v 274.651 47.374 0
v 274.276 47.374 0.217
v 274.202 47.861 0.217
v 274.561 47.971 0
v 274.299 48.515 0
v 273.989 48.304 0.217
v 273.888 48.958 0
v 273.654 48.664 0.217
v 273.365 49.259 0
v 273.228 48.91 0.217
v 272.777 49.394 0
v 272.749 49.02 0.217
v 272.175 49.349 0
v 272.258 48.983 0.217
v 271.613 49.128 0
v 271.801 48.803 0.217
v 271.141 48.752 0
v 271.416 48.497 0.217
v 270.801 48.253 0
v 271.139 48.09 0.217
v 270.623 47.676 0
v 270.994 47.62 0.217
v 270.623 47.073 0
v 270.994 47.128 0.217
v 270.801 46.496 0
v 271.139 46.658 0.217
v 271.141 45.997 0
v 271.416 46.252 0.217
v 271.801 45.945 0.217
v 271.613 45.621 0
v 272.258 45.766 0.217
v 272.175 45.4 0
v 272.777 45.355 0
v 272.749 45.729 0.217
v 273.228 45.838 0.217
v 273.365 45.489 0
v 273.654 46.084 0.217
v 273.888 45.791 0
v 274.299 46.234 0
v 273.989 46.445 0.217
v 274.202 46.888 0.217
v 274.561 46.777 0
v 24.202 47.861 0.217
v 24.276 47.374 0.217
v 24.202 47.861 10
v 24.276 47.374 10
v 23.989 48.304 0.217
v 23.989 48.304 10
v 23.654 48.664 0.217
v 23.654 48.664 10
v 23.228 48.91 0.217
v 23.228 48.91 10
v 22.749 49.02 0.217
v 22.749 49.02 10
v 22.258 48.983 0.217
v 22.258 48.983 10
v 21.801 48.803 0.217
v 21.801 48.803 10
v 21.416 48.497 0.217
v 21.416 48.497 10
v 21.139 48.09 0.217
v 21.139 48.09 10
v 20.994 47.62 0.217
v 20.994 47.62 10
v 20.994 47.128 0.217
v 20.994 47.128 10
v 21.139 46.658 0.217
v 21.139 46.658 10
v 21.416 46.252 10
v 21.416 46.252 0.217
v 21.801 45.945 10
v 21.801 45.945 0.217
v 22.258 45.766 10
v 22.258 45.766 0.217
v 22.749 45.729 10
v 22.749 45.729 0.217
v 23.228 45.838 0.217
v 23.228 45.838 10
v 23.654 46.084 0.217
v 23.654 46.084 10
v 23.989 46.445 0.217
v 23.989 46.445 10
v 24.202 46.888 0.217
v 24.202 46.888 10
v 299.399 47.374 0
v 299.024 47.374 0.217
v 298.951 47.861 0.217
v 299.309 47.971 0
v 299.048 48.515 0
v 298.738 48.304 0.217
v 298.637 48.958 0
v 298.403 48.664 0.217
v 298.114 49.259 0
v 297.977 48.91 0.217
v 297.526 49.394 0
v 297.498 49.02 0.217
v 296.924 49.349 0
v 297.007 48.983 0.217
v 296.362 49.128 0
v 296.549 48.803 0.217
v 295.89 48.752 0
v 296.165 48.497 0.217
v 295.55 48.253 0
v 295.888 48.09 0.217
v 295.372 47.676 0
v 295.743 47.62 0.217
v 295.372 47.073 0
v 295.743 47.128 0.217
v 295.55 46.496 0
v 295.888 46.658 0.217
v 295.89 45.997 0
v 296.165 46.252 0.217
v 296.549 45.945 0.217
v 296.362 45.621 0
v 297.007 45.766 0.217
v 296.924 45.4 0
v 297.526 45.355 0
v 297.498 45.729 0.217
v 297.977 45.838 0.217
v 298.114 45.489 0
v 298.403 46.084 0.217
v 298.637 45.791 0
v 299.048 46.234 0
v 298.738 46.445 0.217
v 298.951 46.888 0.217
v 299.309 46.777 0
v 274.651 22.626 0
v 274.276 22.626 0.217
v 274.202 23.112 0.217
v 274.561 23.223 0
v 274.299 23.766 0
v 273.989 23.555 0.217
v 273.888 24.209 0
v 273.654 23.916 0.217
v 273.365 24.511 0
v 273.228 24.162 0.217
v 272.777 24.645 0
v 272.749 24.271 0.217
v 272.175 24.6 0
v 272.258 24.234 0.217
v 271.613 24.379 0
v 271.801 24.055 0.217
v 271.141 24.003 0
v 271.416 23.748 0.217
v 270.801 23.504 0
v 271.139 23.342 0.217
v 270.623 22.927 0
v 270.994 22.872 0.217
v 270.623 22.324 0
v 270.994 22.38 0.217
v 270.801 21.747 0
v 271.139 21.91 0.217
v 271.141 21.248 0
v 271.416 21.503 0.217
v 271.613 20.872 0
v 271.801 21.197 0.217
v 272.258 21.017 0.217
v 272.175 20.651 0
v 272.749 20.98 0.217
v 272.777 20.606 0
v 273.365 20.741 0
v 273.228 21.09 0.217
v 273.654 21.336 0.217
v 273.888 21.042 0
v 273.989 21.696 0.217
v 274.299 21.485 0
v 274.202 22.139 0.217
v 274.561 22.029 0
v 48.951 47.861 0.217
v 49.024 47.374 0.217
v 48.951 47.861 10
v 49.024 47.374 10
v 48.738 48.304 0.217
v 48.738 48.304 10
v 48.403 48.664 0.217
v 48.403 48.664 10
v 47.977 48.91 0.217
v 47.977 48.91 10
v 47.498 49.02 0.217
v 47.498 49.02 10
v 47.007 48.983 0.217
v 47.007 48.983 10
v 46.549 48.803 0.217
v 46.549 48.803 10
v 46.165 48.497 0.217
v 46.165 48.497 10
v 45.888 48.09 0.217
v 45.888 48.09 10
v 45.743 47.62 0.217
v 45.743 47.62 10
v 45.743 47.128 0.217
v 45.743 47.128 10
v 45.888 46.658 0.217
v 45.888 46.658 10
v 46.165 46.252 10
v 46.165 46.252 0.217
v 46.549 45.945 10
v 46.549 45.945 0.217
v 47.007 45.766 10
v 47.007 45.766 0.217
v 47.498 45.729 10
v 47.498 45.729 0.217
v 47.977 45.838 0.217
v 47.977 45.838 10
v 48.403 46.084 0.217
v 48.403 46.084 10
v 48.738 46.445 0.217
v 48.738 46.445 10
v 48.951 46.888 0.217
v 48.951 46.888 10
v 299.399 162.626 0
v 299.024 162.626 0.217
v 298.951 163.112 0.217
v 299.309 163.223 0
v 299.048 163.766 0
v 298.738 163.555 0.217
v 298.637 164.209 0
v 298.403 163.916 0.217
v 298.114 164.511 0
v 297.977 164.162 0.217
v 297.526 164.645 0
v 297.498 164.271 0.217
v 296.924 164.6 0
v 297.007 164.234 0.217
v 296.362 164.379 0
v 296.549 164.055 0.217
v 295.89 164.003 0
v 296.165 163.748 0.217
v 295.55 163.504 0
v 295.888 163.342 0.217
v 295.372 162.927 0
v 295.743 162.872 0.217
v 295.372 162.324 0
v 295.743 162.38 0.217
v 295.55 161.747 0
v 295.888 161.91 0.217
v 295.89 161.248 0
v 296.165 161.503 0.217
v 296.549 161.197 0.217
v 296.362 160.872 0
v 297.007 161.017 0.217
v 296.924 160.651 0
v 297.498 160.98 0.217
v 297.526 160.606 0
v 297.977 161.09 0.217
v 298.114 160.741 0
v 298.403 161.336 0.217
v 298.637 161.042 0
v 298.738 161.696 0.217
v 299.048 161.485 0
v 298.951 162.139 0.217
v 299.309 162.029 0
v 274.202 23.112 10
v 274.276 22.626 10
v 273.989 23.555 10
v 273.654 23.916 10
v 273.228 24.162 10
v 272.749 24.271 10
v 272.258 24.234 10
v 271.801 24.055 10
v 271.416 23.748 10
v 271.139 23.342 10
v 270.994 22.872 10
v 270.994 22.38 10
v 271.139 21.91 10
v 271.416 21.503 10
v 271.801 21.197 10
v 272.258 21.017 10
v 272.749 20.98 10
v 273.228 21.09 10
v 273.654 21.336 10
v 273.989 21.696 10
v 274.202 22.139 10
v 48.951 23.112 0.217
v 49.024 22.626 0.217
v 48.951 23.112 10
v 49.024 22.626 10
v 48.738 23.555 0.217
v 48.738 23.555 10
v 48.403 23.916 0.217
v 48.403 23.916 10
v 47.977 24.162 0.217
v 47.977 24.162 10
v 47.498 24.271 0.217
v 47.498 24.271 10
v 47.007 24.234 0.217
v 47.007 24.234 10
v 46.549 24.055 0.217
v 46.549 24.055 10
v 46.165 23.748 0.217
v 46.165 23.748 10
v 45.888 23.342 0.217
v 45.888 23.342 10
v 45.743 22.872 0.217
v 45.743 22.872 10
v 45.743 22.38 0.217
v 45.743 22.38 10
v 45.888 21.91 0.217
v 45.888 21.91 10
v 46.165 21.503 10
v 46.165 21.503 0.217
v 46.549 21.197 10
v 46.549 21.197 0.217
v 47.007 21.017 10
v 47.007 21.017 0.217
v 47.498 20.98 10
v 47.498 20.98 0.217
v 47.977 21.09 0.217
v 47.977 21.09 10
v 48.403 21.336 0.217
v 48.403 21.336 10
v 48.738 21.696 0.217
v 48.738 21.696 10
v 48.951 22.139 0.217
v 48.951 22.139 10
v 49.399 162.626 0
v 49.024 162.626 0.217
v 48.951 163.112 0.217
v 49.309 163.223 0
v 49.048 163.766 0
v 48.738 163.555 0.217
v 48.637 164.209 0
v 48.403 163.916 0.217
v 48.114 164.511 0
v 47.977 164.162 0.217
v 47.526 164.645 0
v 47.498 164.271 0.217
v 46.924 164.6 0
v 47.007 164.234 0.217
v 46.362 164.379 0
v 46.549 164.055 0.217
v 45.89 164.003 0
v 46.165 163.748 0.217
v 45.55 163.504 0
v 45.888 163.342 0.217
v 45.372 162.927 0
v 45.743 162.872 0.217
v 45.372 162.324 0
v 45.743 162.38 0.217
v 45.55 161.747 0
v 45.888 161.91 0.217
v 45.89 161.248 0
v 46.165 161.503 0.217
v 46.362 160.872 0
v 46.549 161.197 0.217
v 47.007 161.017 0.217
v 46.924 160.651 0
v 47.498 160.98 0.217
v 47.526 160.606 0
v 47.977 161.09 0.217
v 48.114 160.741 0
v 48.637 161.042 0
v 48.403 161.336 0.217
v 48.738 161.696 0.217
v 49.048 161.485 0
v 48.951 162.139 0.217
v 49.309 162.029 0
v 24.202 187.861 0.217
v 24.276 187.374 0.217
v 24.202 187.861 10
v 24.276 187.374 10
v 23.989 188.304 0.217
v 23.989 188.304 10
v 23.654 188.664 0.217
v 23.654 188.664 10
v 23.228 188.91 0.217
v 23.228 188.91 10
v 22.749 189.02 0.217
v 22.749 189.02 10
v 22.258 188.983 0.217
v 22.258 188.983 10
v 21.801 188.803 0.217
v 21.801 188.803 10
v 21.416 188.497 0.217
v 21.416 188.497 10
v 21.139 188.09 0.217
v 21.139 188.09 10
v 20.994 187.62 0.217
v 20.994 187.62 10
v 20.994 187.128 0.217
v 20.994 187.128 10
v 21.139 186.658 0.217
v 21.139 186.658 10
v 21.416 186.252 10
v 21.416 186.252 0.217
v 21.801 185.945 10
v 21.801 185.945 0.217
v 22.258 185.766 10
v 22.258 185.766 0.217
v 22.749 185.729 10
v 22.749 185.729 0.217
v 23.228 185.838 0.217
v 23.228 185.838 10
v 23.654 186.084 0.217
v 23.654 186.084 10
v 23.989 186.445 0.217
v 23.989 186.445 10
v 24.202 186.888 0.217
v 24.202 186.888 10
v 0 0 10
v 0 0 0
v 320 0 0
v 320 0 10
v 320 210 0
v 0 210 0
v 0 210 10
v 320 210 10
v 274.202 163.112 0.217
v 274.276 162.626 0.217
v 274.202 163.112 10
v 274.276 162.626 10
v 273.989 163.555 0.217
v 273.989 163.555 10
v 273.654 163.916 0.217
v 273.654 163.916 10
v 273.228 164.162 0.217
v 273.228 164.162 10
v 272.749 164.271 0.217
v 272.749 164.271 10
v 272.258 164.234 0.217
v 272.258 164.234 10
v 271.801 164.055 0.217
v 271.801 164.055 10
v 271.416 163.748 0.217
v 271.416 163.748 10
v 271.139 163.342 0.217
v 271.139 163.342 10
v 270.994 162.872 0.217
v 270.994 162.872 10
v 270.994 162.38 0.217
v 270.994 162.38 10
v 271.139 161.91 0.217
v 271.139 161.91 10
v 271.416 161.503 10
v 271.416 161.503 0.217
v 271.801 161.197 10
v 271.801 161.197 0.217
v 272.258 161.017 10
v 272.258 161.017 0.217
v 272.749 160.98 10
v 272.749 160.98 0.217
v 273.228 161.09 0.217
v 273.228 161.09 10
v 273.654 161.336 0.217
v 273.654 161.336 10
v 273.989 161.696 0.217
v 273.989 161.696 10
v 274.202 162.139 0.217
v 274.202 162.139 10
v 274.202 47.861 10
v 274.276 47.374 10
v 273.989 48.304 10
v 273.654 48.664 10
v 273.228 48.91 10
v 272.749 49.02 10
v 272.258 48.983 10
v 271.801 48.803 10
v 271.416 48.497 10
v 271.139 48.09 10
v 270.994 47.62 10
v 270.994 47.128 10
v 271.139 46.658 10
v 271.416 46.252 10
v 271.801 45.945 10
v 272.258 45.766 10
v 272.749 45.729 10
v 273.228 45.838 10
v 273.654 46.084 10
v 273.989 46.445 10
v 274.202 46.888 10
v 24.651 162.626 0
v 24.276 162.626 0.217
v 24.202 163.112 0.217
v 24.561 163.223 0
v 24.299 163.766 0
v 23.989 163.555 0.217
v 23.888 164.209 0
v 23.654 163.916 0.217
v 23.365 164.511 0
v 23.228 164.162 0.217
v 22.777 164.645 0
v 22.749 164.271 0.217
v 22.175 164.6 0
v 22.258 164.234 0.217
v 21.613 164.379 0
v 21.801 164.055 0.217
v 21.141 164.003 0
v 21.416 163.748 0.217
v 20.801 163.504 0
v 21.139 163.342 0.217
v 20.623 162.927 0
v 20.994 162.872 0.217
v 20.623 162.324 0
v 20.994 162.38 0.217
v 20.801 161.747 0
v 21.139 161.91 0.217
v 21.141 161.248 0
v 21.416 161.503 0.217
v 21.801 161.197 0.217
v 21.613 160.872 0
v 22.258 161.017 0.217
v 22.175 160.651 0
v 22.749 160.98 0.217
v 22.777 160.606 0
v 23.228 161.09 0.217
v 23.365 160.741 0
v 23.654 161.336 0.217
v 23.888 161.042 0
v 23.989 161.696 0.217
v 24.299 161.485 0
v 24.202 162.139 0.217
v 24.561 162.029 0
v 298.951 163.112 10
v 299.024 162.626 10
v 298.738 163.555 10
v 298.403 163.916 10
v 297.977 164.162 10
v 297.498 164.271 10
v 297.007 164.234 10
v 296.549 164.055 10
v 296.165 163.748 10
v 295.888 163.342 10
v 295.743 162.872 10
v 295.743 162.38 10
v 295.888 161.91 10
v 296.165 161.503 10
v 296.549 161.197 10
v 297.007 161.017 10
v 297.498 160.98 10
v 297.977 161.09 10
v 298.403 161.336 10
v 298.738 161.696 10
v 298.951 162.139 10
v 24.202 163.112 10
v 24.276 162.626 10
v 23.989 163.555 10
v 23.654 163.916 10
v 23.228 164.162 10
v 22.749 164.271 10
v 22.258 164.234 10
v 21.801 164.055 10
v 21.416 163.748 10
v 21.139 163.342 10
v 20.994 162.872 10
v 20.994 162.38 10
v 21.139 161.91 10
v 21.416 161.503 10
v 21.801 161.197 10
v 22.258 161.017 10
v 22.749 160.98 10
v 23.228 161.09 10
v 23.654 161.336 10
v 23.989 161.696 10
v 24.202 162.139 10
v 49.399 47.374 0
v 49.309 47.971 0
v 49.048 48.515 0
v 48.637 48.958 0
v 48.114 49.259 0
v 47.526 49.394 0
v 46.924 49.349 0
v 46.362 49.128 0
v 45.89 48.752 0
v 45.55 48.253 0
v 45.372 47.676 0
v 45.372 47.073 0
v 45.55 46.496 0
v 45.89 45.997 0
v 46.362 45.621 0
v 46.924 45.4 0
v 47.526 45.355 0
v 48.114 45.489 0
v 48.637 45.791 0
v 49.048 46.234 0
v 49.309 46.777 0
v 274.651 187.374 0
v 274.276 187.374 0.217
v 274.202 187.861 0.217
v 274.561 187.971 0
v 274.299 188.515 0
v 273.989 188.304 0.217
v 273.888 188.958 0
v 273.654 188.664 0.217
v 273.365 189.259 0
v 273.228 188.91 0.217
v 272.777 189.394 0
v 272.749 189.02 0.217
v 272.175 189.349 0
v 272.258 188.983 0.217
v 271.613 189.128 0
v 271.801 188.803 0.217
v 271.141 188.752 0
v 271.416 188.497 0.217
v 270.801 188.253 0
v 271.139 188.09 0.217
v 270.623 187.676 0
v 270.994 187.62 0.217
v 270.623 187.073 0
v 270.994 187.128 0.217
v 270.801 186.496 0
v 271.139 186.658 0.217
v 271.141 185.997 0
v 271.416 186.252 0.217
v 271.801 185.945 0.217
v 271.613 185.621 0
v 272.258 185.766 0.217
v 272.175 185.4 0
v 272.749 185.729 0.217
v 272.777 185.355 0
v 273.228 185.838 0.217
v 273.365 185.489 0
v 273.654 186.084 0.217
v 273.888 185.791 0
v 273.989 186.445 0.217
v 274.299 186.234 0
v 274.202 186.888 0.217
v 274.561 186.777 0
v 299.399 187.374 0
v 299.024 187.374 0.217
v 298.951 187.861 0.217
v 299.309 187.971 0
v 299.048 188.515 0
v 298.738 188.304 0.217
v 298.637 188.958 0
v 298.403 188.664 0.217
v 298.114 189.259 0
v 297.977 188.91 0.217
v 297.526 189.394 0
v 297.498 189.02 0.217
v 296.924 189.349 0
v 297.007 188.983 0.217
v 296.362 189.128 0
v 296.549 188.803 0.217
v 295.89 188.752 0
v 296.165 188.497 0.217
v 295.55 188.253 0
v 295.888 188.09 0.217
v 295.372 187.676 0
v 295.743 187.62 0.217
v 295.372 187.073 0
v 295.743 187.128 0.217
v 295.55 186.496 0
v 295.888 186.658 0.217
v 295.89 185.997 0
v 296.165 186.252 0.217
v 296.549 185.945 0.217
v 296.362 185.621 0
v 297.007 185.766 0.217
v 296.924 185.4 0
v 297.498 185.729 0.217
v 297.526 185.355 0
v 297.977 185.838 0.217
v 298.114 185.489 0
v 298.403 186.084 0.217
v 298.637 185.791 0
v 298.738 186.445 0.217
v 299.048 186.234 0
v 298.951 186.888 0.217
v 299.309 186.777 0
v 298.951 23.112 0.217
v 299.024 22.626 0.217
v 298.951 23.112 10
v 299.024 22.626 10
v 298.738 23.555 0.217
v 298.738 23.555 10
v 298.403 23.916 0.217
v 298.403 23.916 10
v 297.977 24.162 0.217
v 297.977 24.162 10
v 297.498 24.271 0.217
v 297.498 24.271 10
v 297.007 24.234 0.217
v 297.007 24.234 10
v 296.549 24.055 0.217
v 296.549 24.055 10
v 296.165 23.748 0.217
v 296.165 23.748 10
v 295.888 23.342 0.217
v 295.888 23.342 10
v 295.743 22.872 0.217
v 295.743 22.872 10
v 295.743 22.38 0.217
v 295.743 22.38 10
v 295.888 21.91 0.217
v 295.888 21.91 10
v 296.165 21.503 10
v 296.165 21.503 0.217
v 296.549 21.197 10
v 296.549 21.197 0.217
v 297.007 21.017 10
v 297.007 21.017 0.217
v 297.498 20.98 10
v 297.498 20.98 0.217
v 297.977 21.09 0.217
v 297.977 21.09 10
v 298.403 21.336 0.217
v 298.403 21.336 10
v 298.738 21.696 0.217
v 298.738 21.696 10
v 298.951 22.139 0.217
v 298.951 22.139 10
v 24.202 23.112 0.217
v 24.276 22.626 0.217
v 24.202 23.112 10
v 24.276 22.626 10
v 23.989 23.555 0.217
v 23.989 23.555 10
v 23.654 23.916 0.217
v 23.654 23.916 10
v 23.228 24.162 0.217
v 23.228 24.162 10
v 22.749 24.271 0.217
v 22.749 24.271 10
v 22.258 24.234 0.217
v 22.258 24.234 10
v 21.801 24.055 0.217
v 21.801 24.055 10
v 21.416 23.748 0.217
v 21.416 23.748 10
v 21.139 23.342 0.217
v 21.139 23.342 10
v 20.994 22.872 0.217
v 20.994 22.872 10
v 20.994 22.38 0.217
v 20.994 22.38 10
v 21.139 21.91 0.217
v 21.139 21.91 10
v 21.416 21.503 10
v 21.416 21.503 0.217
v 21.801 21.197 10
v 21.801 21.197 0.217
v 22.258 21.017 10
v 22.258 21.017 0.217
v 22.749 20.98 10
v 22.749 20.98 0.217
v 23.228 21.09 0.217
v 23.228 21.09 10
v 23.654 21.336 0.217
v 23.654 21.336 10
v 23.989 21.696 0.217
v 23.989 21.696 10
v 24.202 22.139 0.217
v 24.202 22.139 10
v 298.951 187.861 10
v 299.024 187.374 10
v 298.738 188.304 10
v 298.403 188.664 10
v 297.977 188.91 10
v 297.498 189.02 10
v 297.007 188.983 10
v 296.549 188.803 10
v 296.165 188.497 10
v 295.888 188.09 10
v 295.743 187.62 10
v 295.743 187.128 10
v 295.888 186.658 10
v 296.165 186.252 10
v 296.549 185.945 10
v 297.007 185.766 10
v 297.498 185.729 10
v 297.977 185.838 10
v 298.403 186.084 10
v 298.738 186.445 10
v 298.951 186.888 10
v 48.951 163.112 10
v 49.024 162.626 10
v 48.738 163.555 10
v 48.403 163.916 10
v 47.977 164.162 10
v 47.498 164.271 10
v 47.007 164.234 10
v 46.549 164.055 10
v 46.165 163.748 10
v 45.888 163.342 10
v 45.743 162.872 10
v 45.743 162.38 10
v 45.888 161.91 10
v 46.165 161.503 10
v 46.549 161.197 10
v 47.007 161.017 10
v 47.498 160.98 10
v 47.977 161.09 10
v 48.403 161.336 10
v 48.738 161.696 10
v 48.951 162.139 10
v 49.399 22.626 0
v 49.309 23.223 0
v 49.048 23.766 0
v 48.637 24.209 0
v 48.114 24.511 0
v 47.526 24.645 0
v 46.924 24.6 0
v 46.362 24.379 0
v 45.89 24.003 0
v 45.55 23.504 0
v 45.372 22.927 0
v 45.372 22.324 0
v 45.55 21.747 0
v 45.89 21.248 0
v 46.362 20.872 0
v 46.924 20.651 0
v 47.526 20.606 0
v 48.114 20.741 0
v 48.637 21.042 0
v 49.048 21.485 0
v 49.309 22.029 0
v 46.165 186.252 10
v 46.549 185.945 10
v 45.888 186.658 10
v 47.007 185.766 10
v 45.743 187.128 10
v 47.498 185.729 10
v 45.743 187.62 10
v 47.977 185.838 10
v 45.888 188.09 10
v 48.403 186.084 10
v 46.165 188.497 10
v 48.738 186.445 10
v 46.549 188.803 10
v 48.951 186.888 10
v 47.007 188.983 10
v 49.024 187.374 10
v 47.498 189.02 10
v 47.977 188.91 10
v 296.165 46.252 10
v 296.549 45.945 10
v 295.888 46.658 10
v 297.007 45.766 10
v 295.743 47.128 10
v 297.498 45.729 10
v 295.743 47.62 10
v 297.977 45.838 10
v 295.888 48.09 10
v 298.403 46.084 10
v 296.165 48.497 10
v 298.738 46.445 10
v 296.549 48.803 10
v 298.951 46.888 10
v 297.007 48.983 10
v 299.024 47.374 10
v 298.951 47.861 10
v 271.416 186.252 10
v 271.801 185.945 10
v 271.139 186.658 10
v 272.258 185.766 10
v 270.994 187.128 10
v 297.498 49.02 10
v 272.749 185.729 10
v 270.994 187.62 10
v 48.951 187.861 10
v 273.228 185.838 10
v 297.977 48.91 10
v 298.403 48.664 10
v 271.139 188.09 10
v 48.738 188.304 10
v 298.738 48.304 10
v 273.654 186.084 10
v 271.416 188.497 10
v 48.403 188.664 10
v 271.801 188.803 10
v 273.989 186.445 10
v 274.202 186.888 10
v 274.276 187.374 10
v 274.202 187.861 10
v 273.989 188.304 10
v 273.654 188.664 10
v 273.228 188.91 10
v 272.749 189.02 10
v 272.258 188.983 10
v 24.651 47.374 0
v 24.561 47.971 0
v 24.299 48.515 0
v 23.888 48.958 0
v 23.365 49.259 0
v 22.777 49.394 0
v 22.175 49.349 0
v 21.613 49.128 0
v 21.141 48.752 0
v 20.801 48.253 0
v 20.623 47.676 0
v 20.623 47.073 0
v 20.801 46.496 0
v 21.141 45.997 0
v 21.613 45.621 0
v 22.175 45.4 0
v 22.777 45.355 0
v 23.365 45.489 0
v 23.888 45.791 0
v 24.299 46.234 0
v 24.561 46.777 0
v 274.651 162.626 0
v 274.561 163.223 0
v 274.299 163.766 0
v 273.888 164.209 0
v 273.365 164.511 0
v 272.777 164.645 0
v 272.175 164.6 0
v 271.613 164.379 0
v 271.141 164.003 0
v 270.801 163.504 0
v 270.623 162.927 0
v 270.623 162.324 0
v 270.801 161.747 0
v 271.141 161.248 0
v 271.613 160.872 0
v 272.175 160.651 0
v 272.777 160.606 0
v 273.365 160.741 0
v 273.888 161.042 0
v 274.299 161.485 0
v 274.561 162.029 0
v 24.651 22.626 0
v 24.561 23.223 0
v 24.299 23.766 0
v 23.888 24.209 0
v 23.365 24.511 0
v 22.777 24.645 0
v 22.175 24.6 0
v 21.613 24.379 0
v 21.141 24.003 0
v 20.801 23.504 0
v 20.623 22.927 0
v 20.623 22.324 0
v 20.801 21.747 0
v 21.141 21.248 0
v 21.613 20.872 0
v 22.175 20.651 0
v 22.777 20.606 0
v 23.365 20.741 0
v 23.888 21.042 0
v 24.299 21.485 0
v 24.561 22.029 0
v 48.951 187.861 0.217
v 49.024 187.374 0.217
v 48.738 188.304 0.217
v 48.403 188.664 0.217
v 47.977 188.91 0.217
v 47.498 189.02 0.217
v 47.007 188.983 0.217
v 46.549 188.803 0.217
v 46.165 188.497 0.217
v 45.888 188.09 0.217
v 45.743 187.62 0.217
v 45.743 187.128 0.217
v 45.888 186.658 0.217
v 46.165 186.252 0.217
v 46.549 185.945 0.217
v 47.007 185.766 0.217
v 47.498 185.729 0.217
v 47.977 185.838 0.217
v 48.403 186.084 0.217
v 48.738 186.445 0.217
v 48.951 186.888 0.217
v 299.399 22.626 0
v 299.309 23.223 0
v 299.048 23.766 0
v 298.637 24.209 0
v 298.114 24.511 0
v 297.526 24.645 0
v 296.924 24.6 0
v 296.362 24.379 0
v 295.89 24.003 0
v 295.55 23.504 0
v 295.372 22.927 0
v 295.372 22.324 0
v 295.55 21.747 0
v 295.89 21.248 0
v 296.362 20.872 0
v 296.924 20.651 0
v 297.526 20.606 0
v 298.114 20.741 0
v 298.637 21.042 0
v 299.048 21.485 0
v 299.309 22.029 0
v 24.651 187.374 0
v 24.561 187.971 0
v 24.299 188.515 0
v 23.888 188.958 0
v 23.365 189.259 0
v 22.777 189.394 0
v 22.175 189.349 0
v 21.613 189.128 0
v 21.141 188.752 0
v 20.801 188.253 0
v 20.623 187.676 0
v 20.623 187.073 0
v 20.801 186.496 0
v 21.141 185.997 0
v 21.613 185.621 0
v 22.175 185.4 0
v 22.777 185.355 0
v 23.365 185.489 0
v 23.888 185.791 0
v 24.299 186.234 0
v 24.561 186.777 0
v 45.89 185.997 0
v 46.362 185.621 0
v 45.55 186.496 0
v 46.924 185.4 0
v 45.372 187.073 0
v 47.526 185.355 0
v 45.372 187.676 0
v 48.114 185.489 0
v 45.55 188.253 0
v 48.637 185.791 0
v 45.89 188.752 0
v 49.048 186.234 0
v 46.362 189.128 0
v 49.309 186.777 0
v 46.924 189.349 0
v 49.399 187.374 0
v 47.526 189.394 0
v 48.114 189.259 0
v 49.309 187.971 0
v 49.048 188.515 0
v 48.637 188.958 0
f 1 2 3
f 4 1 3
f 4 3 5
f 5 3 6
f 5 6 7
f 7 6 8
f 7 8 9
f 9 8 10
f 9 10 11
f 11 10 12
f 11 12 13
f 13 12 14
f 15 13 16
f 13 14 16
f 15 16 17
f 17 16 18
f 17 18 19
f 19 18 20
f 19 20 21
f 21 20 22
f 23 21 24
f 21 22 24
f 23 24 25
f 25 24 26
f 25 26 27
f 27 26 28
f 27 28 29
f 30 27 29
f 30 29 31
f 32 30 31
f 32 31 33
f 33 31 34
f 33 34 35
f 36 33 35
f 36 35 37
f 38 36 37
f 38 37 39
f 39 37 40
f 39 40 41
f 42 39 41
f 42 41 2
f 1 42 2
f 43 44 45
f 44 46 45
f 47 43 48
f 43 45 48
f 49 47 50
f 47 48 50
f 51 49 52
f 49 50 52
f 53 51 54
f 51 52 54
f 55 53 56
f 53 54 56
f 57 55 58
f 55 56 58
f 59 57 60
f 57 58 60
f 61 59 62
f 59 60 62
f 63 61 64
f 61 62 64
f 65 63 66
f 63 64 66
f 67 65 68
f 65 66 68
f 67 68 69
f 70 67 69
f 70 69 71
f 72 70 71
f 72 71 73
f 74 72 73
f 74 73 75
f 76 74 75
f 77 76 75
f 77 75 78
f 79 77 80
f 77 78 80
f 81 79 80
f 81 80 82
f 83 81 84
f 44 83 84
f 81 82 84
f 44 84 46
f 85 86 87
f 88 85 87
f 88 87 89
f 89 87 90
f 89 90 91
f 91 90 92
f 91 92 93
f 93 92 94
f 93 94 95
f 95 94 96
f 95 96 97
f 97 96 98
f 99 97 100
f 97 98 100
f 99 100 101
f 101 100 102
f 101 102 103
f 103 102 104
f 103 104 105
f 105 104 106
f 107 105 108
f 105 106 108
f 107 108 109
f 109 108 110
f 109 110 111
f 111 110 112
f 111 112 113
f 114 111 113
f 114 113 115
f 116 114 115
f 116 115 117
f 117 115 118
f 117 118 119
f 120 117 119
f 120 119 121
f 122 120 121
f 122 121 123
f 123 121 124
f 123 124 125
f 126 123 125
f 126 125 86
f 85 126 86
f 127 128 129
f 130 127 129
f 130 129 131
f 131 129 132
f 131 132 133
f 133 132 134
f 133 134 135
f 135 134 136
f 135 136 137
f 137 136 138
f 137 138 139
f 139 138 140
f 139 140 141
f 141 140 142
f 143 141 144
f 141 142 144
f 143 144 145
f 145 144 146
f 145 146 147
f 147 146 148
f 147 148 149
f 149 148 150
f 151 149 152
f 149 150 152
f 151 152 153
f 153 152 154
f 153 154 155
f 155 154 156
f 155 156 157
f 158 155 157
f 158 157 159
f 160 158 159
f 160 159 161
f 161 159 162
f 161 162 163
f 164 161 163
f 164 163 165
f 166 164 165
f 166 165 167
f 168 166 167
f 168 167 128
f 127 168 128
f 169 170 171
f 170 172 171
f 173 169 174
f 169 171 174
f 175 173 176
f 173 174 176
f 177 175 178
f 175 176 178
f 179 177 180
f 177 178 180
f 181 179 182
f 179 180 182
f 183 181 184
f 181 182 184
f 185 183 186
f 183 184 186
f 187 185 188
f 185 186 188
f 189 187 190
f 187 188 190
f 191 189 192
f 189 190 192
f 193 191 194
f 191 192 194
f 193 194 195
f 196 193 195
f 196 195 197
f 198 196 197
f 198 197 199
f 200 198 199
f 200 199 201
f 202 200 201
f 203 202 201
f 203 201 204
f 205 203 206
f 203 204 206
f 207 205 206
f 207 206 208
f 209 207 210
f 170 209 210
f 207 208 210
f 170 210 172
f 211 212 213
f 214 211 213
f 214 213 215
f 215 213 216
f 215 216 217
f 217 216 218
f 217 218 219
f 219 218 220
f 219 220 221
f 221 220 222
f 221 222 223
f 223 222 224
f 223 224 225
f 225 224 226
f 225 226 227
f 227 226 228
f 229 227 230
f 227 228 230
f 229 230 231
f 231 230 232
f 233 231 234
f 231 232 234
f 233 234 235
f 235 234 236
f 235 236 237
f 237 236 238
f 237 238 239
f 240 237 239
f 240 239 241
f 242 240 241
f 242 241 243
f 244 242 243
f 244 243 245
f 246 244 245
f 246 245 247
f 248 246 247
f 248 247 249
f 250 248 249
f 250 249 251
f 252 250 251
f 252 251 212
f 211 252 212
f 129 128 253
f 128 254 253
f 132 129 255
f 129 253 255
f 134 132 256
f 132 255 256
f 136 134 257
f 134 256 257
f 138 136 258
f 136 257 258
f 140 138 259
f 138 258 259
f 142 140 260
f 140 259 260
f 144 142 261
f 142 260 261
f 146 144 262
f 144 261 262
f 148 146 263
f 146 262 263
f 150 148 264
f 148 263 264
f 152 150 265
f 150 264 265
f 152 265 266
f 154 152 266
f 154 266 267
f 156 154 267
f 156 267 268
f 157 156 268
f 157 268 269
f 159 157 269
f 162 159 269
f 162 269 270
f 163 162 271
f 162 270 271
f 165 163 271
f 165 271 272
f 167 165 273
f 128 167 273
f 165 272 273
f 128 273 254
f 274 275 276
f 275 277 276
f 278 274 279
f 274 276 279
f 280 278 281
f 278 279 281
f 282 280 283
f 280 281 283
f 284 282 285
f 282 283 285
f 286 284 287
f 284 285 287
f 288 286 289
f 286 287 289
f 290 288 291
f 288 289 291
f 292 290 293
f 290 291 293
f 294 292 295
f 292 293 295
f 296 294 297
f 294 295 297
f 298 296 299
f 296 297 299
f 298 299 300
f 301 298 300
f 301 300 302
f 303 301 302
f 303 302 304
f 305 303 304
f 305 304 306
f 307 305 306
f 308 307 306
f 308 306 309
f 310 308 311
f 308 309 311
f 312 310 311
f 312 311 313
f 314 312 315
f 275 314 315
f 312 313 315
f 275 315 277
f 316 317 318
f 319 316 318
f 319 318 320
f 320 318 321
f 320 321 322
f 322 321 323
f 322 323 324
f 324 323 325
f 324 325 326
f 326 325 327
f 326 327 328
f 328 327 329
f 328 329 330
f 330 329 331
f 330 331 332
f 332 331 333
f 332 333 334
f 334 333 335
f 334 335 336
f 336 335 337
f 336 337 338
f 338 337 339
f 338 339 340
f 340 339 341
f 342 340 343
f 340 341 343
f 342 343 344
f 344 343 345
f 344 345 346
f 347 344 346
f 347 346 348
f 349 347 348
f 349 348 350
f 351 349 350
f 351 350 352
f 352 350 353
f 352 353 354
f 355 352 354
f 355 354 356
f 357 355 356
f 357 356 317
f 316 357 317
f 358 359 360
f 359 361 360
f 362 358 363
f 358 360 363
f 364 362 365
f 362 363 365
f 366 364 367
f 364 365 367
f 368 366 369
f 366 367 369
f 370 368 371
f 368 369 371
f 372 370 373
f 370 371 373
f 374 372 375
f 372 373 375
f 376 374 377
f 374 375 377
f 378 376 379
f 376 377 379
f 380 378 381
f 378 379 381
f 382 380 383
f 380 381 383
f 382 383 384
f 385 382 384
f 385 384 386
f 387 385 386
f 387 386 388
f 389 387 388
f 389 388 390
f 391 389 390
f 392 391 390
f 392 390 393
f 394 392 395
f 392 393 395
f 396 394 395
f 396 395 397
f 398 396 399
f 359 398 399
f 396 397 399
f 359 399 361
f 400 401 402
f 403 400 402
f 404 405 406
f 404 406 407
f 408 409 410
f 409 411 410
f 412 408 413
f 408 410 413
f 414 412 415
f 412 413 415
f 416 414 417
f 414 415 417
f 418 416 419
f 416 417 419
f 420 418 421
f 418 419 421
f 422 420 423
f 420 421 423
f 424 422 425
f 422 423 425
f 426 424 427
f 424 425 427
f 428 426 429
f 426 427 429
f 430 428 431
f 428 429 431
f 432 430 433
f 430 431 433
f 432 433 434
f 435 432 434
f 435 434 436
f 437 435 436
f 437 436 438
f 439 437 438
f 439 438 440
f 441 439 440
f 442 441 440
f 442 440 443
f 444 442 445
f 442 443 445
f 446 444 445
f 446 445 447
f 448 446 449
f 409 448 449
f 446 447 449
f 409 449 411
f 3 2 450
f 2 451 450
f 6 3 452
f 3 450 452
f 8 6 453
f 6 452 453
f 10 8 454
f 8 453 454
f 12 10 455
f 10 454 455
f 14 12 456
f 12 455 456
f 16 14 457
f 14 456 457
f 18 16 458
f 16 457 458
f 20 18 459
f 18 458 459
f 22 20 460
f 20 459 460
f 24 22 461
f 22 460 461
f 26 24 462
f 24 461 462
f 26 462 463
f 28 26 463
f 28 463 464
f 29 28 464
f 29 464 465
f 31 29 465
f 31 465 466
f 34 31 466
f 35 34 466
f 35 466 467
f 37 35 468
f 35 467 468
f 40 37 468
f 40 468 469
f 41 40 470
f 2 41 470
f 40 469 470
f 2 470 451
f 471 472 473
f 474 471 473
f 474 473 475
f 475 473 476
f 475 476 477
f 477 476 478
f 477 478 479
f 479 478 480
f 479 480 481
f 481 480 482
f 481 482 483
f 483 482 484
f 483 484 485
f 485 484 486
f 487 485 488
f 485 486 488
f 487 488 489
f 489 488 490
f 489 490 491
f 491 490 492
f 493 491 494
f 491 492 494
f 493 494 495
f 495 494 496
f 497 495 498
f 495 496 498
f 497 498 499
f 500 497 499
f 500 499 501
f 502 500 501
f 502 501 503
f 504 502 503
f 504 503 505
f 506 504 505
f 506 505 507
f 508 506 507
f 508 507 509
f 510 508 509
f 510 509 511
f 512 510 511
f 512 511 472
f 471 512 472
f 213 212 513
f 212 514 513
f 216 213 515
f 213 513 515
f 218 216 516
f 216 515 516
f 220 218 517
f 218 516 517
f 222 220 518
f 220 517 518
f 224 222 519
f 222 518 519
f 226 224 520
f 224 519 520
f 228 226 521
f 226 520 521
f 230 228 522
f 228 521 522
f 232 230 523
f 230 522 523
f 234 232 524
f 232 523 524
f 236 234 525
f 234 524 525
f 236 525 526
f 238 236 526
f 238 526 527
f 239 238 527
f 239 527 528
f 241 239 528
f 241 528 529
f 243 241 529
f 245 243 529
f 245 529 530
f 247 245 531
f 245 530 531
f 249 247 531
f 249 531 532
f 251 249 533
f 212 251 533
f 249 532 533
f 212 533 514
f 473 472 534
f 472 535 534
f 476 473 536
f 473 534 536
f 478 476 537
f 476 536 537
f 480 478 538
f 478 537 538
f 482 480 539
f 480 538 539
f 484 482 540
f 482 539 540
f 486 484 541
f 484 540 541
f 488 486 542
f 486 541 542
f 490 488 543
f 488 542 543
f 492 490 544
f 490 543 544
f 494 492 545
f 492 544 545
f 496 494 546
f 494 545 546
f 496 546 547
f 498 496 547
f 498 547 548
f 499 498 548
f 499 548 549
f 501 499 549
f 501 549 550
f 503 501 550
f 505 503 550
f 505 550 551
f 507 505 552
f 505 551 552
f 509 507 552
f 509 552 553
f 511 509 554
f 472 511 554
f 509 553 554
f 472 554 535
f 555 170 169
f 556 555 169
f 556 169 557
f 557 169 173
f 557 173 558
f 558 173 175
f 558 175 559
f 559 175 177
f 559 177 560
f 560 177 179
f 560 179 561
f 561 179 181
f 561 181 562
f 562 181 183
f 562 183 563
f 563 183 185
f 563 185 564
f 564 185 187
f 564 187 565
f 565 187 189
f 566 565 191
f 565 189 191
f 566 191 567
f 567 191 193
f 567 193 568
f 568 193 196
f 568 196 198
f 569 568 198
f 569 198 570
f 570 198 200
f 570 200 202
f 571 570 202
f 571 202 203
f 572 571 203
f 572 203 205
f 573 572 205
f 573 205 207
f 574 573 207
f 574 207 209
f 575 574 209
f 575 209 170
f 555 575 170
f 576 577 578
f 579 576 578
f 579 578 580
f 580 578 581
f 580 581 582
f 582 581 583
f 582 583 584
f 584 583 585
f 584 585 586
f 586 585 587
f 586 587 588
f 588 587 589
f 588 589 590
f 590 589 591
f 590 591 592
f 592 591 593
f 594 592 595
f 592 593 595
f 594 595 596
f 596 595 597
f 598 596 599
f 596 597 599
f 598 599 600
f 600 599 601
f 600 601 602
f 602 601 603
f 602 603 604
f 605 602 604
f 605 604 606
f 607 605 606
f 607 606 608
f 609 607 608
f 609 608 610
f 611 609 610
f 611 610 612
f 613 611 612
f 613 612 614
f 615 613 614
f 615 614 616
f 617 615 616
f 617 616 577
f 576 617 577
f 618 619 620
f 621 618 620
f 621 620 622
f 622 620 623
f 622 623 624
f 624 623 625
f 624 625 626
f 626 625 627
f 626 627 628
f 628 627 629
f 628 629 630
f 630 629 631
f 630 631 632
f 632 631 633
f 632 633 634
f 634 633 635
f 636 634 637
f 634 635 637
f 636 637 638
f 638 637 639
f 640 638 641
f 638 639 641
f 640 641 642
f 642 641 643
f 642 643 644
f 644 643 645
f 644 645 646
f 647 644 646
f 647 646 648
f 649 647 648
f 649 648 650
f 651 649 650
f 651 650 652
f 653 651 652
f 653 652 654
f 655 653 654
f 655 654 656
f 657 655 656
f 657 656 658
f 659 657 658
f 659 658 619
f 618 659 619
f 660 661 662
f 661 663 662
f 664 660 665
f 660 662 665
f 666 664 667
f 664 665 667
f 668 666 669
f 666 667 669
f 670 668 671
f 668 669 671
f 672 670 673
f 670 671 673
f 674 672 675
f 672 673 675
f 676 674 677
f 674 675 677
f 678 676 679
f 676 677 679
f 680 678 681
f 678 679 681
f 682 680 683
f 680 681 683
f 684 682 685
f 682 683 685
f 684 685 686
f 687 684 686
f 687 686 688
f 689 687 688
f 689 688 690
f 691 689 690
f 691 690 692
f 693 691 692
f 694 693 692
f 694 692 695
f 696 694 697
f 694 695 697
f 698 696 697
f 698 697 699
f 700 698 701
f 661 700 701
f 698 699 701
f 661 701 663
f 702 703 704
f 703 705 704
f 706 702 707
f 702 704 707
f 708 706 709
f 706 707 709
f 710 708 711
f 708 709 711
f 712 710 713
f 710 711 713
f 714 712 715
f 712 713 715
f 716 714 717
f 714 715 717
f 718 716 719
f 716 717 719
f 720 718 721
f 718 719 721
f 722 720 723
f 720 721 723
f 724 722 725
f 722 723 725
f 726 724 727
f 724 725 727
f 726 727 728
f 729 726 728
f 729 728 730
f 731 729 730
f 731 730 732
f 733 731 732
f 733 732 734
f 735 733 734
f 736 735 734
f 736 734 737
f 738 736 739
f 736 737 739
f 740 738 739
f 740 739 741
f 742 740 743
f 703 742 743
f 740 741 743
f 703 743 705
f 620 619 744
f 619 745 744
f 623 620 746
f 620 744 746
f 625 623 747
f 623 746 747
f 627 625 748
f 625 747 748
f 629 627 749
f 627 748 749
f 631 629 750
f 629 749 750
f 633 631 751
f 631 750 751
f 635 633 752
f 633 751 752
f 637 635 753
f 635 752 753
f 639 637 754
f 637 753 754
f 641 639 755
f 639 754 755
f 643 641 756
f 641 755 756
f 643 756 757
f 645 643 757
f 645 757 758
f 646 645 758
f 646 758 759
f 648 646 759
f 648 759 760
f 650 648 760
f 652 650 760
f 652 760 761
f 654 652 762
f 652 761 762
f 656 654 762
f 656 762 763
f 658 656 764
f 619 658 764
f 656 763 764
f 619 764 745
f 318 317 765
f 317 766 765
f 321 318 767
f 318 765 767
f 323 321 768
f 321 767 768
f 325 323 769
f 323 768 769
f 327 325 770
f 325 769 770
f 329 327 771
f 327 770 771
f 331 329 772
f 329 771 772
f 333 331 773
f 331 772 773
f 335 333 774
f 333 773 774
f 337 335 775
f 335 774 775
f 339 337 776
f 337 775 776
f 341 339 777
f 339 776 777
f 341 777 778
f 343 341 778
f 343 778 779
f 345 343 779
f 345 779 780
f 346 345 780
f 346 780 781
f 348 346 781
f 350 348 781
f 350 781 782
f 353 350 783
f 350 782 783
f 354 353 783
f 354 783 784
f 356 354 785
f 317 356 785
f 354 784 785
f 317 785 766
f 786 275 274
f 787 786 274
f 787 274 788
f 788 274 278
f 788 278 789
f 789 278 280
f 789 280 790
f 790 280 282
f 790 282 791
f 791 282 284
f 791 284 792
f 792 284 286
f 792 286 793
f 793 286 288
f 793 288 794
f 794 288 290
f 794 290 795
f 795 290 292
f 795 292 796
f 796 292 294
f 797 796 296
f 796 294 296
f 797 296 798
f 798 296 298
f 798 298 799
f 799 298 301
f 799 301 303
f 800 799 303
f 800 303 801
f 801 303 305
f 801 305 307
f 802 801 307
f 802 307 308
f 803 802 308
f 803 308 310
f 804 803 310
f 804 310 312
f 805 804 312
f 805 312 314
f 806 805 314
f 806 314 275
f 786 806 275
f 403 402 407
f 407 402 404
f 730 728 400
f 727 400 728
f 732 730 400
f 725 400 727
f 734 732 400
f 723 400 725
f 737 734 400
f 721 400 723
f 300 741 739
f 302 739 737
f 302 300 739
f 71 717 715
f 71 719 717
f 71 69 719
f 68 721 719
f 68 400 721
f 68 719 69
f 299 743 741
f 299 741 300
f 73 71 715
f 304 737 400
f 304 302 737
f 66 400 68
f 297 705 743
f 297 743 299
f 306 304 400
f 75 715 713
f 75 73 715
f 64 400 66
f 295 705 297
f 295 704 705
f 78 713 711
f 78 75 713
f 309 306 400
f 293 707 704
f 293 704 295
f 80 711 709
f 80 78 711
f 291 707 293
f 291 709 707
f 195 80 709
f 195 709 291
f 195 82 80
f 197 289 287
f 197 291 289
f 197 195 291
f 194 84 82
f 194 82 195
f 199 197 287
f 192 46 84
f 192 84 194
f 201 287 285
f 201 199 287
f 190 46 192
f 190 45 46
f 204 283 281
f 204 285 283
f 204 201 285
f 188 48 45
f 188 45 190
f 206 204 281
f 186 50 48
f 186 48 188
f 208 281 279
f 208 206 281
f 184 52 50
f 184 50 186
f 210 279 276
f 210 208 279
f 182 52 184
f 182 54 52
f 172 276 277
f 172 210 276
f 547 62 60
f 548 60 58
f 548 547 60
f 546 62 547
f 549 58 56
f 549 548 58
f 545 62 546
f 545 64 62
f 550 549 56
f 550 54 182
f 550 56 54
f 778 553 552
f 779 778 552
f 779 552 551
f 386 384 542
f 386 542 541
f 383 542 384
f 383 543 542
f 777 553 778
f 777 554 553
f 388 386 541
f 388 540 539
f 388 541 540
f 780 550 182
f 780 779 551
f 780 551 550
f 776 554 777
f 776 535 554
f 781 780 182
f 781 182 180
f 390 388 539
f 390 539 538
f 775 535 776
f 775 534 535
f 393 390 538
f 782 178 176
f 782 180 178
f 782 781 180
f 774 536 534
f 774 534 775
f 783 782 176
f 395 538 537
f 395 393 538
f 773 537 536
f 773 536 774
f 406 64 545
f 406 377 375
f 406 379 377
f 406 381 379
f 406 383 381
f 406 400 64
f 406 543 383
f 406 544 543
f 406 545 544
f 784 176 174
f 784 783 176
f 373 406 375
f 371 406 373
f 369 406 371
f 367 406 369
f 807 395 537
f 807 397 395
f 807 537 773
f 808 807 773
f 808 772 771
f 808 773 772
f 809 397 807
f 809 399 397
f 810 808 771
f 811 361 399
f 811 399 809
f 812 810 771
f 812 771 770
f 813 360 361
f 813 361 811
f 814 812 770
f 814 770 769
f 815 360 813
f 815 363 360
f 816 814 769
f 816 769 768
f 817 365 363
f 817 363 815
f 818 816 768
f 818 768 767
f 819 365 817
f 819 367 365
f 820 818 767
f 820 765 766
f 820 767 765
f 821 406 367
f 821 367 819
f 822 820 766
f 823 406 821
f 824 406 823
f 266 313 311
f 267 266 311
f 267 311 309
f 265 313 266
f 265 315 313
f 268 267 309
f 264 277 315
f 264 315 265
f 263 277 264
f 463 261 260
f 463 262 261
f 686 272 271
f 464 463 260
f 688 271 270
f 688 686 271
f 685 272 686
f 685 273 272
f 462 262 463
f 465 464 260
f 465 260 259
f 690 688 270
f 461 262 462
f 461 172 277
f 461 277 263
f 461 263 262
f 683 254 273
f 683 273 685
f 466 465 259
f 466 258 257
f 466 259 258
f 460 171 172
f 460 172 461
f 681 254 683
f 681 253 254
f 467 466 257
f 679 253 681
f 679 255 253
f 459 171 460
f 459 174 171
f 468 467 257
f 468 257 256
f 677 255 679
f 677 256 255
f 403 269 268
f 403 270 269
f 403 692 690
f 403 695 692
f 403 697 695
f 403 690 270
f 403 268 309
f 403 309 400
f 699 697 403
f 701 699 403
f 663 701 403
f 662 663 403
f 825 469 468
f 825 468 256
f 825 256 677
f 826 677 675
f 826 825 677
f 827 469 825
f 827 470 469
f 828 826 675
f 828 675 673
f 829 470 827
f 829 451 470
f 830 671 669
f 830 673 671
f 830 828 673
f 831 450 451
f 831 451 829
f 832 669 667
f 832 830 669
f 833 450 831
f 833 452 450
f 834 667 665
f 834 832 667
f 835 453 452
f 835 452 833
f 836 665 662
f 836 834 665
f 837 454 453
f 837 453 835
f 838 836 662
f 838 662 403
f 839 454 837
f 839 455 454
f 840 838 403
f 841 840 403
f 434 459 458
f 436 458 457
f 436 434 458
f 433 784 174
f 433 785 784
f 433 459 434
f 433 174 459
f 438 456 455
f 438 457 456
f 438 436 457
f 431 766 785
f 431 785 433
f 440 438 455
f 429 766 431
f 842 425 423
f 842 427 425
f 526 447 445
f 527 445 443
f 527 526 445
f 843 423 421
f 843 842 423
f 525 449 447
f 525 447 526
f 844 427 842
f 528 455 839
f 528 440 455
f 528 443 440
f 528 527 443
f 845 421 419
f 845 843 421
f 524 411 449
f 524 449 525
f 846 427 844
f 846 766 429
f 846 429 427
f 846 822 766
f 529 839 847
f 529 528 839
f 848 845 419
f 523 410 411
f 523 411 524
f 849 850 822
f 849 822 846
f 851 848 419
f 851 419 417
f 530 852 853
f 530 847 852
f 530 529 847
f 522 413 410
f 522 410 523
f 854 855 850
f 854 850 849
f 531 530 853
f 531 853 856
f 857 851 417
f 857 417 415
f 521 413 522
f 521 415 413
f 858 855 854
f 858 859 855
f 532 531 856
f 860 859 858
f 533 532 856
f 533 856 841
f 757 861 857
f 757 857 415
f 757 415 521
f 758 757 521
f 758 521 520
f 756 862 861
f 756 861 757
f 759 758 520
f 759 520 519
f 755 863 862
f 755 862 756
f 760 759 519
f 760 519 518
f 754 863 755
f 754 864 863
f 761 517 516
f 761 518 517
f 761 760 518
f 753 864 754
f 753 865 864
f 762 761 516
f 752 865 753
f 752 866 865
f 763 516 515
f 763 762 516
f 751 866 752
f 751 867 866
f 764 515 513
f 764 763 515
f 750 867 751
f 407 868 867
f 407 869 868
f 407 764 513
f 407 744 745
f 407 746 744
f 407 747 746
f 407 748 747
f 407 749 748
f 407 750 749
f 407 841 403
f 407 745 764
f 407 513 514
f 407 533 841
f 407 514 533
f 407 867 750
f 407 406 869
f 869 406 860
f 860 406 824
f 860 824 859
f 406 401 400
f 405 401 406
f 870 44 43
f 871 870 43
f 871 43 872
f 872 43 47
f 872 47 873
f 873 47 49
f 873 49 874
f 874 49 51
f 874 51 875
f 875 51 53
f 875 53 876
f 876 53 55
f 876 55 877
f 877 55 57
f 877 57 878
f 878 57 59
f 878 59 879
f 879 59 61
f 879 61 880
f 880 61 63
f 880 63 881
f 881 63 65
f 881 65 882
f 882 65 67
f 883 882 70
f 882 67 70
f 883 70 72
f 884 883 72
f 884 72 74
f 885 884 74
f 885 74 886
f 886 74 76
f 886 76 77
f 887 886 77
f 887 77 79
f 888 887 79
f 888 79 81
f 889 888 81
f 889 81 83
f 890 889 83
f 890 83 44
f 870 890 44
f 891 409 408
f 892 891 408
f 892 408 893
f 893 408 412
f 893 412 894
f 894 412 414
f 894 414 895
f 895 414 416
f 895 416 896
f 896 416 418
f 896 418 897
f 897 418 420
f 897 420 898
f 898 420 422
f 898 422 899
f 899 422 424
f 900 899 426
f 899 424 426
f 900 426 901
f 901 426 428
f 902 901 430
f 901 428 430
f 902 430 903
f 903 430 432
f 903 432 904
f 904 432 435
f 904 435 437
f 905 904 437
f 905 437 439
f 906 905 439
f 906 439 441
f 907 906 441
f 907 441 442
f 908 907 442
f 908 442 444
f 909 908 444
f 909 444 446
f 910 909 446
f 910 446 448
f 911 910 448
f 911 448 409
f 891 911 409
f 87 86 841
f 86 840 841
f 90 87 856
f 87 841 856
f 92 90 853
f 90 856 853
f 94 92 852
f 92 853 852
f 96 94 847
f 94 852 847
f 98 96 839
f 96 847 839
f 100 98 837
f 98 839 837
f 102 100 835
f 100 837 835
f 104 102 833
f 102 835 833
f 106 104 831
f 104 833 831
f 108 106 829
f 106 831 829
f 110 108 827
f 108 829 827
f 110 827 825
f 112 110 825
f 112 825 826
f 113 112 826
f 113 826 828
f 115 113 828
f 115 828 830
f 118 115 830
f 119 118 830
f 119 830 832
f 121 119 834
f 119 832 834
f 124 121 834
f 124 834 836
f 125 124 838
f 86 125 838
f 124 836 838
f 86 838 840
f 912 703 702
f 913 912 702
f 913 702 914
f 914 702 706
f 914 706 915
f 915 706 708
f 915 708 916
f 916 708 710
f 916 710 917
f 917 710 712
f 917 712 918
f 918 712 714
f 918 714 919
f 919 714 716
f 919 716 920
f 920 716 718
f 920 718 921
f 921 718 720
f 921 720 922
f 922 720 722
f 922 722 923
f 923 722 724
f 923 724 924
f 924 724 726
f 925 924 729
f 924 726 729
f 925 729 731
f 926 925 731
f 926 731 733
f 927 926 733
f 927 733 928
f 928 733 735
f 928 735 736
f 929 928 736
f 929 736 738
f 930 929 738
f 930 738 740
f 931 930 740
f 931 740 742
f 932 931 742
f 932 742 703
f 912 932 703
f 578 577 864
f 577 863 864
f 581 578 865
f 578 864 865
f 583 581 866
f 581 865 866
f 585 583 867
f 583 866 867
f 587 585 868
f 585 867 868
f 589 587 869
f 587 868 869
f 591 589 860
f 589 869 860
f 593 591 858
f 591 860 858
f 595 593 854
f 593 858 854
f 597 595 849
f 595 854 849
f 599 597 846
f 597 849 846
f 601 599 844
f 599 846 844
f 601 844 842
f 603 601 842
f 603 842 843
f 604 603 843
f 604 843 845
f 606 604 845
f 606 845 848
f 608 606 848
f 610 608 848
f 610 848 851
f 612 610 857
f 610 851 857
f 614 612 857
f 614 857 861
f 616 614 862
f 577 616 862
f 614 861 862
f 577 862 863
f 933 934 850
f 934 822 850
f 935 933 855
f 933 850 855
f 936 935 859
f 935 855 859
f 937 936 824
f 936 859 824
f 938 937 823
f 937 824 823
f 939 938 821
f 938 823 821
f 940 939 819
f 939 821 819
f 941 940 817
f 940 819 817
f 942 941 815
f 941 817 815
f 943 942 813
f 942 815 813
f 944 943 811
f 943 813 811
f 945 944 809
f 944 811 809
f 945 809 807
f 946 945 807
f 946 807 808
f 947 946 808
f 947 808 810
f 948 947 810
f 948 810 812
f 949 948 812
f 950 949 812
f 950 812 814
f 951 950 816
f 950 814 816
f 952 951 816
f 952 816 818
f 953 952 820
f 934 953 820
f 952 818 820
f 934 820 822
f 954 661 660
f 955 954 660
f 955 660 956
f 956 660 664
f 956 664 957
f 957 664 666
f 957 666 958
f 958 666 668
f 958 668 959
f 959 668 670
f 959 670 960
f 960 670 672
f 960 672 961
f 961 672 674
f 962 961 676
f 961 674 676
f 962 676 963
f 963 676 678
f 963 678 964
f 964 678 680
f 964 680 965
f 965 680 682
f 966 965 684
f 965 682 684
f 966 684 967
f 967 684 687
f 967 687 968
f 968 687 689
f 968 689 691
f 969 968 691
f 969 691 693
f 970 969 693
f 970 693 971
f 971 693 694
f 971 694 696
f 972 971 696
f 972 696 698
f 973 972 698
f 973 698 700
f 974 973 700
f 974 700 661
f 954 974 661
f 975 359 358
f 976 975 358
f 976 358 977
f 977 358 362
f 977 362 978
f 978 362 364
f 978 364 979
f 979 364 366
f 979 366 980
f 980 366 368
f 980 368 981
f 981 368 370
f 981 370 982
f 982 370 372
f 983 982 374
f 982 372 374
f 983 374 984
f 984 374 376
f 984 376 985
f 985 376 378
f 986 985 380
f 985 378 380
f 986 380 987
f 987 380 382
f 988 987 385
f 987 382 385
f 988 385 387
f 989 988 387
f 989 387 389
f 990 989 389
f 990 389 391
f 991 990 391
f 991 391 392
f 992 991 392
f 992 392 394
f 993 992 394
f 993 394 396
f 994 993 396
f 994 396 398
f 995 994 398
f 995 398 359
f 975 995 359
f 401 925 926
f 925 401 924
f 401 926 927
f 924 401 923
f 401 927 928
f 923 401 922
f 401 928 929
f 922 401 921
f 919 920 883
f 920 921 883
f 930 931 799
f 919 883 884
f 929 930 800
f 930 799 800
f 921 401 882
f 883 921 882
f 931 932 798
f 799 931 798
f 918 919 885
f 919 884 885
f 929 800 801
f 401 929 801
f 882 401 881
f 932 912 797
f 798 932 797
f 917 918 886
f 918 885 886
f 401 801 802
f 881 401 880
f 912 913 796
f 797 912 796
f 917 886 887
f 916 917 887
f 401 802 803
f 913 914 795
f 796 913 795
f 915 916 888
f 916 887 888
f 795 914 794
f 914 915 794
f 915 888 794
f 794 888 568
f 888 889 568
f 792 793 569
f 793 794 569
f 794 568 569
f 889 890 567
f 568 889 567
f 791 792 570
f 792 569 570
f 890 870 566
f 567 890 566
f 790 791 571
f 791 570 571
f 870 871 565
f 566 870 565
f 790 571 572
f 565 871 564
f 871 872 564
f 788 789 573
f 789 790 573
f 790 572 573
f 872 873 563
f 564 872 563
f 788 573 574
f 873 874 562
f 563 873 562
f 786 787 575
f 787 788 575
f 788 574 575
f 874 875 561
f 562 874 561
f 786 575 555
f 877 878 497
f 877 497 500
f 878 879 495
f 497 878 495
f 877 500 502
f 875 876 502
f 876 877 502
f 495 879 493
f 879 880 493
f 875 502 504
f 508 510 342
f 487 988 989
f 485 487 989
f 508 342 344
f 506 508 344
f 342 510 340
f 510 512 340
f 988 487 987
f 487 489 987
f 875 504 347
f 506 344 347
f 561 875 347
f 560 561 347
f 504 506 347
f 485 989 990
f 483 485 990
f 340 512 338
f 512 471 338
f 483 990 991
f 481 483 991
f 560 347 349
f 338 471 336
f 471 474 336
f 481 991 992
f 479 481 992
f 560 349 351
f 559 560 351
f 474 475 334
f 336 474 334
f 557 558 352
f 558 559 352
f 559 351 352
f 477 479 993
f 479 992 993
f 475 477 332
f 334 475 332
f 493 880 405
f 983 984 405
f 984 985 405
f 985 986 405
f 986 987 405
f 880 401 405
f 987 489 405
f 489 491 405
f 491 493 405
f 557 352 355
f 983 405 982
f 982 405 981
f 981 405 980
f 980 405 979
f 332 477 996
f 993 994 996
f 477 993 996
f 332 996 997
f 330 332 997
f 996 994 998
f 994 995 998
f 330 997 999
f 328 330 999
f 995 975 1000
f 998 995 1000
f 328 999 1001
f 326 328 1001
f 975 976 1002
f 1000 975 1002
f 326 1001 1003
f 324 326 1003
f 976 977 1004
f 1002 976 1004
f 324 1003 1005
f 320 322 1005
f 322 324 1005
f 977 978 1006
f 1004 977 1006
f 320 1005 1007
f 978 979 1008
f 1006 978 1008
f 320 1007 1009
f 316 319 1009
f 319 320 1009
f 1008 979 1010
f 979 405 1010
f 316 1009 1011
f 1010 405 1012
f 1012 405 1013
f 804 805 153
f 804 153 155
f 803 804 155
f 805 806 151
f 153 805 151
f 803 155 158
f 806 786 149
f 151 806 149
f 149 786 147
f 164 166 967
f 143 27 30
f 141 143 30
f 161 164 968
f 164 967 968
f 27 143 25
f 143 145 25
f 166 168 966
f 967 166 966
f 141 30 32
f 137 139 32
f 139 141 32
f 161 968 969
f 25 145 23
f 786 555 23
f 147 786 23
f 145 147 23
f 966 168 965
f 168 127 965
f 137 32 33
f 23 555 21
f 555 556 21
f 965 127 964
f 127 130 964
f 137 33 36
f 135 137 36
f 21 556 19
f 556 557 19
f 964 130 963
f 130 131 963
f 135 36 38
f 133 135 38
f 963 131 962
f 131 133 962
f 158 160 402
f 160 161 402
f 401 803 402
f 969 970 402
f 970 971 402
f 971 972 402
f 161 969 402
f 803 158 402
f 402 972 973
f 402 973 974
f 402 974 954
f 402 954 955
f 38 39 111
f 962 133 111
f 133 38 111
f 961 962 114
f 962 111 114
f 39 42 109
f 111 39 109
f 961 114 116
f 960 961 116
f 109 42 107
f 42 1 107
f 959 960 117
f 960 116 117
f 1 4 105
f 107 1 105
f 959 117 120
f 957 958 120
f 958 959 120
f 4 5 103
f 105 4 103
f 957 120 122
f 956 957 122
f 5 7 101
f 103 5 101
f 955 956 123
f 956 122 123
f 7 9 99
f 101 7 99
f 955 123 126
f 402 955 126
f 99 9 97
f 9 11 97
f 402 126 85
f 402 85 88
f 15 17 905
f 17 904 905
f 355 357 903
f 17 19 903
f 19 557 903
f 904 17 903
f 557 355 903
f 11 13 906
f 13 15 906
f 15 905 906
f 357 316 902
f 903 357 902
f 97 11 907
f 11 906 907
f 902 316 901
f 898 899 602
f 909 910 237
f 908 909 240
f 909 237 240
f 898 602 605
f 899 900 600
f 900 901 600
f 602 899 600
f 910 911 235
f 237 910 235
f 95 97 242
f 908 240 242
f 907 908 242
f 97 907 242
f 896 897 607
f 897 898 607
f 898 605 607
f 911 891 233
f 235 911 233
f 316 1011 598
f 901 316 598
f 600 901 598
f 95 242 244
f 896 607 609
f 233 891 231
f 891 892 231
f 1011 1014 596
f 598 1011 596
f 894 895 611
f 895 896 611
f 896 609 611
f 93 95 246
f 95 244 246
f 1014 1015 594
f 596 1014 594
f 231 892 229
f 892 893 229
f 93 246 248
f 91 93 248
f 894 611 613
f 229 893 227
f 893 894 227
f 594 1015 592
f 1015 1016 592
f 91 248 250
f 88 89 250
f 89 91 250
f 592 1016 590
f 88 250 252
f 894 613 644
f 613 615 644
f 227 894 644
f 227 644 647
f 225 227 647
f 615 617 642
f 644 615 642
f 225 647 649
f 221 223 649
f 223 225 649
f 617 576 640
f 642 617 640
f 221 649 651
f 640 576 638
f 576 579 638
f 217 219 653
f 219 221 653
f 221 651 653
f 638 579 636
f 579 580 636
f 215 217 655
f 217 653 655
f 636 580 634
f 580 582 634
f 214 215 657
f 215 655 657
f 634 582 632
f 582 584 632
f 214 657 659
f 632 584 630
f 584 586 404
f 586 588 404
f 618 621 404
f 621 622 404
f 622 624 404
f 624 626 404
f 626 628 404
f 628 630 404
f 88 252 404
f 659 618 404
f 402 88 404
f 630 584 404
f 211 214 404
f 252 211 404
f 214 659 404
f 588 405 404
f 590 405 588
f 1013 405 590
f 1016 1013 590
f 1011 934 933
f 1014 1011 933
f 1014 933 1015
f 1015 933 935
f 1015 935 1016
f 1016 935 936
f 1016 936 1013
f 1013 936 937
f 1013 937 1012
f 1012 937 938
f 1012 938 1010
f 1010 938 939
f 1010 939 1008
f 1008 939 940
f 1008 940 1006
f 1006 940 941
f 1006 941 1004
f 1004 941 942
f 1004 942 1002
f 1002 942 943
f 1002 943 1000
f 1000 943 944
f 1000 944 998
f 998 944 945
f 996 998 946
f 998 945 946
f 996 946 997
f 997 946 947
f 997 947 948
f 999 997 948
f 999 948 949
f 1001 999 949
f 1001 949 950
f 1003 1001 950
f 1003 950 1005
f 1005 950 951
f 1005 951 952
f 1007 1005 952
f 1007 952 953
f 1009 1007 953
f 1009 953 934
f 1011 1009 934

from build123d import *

# Parameters (mm, degrees)
SKETCH_1_W                  = 320
SKETCH_1_H                  = 210
EXTRUDE_1_DEPTH             = 10
HOLE_WIZARD_M41_D           = 3.3
HOLE_WIZARD_M41_DEPTH       = 11.5
HOLE_WIZARD_M41_CSINK_D     = 4.05
HOLE_WIZARD_M41_CSINK_ANGLE = 120
HOLE_WIZARD_M41_TIP         = 0.991420021


with BuildPart() as part:
    # Эскиз1 → Бобышка-Вытянуть1 (new body)
    with BuildSketch(Plane.XY):
        with Locations((160, 105)):
            Rectangle(SKETCH_1_W, SKETCH_1_H)
    extrude(amount=EXTRUDE_1_DEPTH)

    # Отверстие обработанное метчиком M41
    with Locations(Plane(origin=(0, 0, 0), x_dir=(-1, 0, 0), z_dir=(0, 0, -1))):
        with Locations((-22.625631329, 22.625631329), (-47.374368671, 22.625631329), (-47.374368671, 47.374368671), (-22.625631329, 47.374368671), (-297.374368671, 47.374368671), (-272.625631329, 47.374368671), (-272.625631329, 22.625631329), (-297.374368671, 22.625631329), (-22.625631329, 162.625631329), (-47.374368671, 162.625631329), (-47.374368671, 187.374368671), (-22.625631329, 187.374368671), (-297.374368671, 187.374368671), (-272.625631329, 187.374368671), (-272.625631329, 162.625631329), (-297.374368671, 162.625631329)):
            CounterSinkHole(HOLE_WIZARD_M41_D / 2, HOLE_WIZARD_M41_CSINK_D / 2, depth=HOLE_WIZARD_M41_DEPTH, counter_sink_angle=HOLE_WIZARD_M41_CSINK_ANGLE)
            with Locations((0, 0, -(HOLE_WIZARD_M41_DEPTH + HOLE_WIZARD_M41_TIP / 2))):  # 118° drill point
                Cone(0, HOLE_WIZARD_M41_D / 2, HOLE_WIZARD_M41_TIP, mode=Mode.SUBTRACT)


solid = part.part
